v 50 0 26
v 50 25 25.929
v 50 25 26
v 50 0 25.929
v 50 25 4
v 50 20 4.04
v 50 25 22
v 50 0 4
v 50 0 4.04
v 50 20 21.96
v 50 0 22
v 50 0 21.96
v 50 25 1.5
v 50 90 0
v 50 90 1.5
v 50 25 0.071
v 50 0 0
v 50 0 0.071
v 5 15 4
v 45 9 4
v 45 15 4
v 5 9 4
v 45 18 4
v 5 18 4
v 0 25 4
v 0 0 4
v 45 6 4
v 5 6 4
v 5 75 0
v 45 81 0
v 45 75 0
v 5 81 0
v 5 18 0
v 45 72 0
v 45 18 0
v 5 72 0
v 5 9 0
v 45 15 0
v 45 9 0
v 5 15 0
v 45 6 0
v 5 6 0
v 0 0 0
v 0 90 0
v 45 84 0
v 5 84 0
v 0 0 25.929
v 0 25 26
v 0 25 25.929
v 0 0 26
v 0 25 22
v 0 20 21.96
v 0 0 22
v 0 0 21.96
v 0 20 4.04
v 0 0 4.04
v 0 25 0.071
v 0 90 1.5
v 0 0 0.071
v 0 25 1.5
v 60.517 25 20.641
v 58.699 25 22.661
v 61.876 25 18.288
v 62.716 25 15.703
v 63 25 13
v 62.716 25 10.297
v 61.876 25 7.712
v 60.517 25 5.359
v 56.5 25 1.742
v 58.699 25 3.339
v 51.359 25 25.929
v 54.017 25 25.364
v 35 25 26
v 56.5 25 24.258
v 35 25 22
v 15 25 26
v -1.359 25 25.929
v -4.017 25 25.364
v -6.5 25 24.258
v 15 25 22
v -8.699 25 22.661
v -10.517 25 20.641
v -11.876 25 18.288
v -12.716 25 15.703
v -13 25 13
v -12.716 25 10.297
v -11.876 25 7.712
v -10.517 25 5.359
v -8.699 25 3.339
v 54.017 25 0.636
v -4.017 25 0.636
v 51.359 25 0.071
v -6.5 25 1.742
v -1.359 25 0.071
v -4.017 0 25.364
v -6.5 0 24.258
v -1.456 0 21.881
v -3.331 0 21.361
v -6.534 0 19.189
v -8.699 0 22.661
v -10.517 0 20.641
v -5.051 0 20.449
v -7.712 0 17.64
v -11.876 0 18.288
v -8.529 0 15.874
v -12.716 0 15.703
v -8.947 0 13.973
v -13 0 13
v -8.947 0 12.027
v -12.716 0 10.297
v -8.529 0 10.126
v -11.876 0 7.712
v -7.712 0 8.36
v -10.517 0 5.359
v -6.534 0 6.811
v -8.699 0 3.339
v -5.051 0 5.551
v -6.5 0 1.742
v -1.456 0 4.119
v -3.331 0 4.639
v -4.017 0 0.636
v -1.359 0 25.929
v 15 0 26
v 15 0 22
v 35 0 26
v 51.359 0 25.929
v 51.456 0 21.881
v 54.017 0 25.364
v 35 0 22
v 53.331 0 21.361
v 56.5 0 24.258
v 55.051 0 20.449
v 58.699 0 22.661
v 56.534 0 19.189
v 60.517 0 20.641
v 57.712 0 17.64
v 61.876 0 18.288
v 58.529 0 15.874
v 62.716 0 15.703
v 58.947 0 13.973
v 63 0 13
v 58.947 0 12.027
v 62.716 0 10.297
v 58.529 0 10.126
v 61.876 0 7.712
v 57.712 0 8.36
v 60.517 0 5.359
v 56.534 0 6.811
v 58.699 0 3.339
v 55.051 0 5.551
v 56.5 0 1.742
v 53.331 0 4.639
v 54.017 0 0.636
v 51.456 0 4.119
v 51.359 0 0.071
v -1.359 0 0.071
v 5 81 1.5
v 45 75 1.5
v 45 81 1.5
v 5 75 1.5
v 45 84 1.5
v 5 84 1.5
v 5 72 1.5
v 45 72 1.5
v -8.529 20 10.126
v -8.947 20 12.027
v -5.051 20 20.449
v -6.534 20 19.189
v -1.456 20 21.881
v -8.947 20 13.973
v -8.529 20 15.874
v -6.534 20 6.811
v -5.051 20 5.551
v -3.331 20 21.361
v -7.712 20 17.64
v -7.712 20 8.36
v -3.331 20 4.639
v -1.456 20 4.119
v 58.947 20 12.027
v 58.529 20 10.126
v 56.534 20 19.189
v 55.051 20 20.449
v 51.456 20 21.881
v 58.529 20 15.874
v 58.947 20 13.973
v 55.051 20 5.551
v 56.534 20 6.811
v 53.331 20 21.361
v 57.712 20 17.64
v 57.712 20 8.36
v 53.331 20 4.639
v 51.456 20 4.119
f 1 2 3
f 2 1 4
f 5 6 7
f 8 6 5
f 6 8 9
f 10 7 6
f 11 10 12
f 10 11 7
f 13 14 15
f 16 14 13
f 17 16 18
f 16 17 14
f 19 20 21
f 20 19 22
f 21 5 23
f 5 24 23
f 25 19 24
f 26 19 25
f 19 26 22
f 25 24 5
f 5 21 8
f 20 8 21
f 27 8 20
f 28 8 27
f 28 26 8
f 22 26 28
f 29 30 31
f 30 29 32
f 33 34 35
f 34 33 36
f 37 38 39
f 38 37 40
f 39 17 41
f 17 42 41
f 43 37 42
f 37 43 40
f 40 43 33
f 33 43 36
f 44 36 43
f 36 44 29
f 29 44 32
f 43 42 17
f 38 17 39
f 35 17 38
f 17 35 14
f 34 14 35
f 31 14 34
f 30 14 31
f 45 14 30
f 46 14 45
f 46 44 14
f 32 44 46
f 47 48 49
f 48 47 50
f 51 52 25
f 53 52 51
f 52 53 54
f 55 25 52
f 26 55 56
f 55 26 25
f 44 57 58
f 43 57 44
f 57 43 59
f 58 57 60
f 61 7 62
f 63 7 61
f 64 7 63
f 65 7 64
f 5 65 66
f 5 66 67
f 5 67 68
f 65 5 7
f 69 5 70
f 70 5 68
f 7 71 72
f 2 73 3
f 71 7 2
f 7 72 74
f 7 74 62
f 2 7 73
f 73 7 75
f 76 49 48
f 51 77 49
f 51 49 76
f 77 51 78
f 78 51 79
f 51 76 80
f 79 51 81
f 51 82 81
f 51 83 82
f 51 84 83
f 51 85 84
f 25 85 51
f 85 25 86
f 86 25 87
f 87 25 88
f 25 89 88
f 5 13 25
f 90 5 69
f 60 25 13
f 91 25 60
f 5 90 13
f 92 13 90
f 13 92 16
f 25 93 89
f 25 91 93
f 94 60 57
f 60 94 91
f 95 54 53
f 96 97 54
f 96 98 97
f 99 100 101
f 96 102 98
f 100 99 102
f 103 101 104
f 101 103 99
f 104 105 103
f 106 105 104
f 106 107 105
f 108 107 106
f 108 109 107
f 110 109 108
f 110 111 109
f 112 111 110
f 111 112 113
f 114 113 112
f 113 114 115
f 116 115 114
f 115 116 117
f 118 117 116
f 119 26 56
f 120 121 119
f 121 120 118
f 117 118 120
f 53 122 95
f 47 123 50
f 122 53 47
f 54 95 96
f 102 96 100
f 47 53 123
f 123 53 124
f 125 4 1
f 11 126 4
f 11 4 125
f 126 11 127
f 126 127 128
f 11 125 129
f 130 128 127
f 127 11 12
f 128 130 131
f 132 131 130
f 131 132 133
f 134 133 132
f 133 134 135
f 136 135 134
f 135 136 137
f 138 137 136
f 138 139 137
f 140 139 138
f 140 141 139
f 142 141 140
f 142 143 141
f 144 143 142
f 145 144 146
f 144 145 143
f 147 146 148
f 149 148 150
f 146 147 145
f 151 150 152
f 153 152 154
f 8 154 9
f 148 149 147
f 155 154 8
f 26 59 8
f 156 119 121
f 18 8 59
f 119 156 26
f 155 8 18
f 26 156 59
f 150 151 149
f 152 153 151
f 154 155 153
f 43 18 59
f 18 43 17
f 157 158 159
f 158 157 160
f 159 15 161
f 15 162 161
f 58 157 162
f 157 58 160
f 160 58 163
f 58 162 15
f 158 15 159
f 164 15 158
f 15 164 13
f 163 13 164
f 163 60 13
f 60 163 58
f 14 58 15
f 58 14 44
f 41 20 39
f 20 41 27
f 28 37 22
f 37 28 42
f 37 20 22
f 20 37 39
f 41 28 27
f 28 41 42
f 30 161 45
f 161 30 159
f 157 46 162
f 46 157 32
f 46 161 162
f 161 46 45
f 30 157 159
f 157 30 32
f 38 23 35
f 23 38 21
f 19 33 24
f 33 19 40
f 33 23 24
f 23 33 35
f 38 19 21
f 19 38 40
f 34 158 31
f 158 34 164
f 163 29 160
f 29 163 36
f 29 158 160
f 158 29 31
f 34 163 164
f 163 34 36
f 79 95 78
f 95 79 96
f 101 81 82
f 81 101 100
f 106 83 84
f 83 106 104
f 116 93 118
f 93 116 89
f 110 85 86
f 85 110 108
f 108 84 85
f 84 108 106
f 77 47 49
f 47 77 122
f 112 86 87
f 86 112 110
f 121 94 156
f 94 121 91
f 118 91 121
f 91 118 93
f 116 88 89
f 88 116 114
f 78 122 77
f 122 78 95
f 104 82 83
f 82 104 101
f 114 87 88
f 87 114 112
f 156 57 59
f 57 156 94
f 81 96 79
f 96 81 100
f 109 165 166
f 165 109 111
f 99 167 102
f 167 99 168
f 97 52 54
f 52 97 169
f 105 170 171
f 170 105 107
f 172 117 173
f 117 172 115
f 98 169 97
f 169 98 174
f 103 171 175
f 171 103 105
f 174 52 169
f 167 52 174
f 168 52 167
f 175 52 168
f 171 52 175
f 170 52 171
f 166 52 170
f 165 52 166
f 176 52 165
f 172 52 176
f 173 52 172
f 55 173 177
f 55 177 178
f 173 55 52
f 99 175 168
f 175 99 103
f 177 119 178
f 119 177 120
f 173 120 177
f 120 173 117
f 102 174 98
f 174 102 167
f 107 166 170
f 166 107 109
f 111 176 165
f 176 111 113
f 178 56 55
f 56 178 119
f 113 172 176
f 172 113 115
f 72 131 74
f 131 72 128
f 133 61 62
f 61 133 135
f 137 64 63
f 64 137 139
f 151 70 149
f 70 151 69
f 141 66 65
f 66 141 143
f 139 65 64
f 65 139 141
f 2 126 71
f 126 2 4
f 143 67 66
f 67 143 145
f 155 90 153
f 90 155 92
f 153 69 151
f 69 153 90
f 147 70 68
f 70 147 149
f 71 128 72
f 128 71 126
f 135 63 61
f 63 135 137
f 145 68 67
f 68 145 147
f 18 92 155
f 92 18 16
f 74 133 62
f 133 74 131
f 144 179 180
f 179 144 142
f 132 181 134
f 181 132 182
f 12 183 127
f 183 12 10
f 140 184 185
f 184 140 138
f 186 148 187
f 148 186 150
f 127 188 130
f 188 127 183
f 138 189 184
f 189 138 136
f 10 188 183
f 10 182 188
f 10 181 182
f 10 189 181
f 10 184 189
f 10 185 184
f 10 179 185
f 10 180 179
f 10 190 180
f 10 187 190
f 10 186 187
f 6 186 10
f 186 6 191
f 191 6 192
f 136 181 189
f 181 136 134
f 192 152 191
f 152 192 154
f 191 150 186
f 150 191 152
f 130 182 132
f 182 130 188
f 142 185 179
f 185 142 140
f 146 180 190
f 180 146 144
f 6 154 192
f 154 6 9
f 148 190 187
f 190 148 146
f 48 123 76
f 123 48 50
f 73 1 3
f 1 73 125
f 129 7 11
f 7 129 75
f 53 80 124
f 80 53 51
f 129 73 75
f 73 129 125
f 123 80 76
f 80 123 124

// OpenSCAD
// file: variables.scad
// Set variables related to the creation of the rod and
// strap holder. All measurements are in mm

// Variables related to Rod
rod_r=7; //rod radius
rod_l=140; //rod length
rod_g=5; //rod groove radius
rod_res=8; //rod resolution

rod_groove_l=[4,4,8];//
rod_groove_p=[12,22,28];//
rod_groove_array=3;
rod_in_strap_space=2;//spacing between rod and the curve

// Variables realted to strap holder
strap_holder_w=50; // strap holder width
strap_holder_t=1.5; //strap holder thickness
strap_holder_l=90; //strap holder length
holder_w=25; //curved holder width
strap_w=40; //velcro strap width
strap_t=3; //velcro strap groove thickness
curve_sup_t=5; //groove support thichness
curve_t=4; //curve thickness

groov_p_y=[6,15]; //y-position of strap grooves 

groov_array_length=2;//length of grooves y-position array 
curve_op=20;//curve upper openning window width 

// Useful calculations (Do not modify)
groov_p_x=(strap_holder_w-strap_w)/2;

curve_or=rod_r+rod_in_strap_space+curve_t; //curve outer radius
curve_ir=rod_r+rod_in_strap_space; //curve inner radius
window_y_p=(strap_holder_w-curve_op)/2;//y-position of window
// main file
/**
 * Create the strap holder
 * This section should consist of a bottom plate to hold the main strap
 * and a side section to hold the rod in place. 
**/

include <variables.scad>; // Include variables

module strap_holder(){
    difference(){//building the flat area
        union(){
            cube([strap_holder_w,holder_w,curve_t]);
            cube([strap_holder_w,strap_holder_l,strap_holder_t]);
        }
        
        //cutting the grooves for the strap to hold in
        for(i=[0:1:groov_array_length-1]) {
            translate([groov_p_x,groov_p_y[i],0])cube([strap_w,strap_t,curve_t]);
            translate([groov_p_x,strap_holder_l-strap_t-groov_p_y[i],0])cube([strap_w,strap_t,curve_t]);
        }
    }

    /** Curved section to hold rod in place.
      * Must primarily resist torque forces.
    **/    
    //building the left curve 
    difference(){
        translate([0,0,curve_or])
        rotate([-90,0,0])
        difference(){
            cylinder(r=curve_or,h=holder_w);//outer cylinder
            translate([0,0,-curve_sup_t])cylinder(r=curve_ir,h=holder_w);//inner cylinder shifted to make the support with support thickness
        }
        translate([0,-.1,0])cube(300);
    }

//same as the left curve but mirrored and shifted to the end
    translate([strap_holder_w,0,0])
    mirror([1,0,0])
    difference(){
        translate([0,0,curve_or])rotate([-90,0,0])difference(){
            cylinder(r=curve_or,h=holder_w);
            translate([0,0,-curve_sup_t])cylinder(r=curve_ir,h=holder_w);
        }
        translate([0,-.1,0])
        cube(300);
    }

    difference(){//building the uppper straight part of the curves to hold the rod in place and cut itfor an intrance
        translate([0,0,curve_or+curve_ir])
        cube([strap_holder_w,holder_w,curve_t]);
        translate([window_y_p,0,curve_or+curve_ir])
        cube([curve_op,holder_w,curve_t]);
    }
}

strap_holder();
